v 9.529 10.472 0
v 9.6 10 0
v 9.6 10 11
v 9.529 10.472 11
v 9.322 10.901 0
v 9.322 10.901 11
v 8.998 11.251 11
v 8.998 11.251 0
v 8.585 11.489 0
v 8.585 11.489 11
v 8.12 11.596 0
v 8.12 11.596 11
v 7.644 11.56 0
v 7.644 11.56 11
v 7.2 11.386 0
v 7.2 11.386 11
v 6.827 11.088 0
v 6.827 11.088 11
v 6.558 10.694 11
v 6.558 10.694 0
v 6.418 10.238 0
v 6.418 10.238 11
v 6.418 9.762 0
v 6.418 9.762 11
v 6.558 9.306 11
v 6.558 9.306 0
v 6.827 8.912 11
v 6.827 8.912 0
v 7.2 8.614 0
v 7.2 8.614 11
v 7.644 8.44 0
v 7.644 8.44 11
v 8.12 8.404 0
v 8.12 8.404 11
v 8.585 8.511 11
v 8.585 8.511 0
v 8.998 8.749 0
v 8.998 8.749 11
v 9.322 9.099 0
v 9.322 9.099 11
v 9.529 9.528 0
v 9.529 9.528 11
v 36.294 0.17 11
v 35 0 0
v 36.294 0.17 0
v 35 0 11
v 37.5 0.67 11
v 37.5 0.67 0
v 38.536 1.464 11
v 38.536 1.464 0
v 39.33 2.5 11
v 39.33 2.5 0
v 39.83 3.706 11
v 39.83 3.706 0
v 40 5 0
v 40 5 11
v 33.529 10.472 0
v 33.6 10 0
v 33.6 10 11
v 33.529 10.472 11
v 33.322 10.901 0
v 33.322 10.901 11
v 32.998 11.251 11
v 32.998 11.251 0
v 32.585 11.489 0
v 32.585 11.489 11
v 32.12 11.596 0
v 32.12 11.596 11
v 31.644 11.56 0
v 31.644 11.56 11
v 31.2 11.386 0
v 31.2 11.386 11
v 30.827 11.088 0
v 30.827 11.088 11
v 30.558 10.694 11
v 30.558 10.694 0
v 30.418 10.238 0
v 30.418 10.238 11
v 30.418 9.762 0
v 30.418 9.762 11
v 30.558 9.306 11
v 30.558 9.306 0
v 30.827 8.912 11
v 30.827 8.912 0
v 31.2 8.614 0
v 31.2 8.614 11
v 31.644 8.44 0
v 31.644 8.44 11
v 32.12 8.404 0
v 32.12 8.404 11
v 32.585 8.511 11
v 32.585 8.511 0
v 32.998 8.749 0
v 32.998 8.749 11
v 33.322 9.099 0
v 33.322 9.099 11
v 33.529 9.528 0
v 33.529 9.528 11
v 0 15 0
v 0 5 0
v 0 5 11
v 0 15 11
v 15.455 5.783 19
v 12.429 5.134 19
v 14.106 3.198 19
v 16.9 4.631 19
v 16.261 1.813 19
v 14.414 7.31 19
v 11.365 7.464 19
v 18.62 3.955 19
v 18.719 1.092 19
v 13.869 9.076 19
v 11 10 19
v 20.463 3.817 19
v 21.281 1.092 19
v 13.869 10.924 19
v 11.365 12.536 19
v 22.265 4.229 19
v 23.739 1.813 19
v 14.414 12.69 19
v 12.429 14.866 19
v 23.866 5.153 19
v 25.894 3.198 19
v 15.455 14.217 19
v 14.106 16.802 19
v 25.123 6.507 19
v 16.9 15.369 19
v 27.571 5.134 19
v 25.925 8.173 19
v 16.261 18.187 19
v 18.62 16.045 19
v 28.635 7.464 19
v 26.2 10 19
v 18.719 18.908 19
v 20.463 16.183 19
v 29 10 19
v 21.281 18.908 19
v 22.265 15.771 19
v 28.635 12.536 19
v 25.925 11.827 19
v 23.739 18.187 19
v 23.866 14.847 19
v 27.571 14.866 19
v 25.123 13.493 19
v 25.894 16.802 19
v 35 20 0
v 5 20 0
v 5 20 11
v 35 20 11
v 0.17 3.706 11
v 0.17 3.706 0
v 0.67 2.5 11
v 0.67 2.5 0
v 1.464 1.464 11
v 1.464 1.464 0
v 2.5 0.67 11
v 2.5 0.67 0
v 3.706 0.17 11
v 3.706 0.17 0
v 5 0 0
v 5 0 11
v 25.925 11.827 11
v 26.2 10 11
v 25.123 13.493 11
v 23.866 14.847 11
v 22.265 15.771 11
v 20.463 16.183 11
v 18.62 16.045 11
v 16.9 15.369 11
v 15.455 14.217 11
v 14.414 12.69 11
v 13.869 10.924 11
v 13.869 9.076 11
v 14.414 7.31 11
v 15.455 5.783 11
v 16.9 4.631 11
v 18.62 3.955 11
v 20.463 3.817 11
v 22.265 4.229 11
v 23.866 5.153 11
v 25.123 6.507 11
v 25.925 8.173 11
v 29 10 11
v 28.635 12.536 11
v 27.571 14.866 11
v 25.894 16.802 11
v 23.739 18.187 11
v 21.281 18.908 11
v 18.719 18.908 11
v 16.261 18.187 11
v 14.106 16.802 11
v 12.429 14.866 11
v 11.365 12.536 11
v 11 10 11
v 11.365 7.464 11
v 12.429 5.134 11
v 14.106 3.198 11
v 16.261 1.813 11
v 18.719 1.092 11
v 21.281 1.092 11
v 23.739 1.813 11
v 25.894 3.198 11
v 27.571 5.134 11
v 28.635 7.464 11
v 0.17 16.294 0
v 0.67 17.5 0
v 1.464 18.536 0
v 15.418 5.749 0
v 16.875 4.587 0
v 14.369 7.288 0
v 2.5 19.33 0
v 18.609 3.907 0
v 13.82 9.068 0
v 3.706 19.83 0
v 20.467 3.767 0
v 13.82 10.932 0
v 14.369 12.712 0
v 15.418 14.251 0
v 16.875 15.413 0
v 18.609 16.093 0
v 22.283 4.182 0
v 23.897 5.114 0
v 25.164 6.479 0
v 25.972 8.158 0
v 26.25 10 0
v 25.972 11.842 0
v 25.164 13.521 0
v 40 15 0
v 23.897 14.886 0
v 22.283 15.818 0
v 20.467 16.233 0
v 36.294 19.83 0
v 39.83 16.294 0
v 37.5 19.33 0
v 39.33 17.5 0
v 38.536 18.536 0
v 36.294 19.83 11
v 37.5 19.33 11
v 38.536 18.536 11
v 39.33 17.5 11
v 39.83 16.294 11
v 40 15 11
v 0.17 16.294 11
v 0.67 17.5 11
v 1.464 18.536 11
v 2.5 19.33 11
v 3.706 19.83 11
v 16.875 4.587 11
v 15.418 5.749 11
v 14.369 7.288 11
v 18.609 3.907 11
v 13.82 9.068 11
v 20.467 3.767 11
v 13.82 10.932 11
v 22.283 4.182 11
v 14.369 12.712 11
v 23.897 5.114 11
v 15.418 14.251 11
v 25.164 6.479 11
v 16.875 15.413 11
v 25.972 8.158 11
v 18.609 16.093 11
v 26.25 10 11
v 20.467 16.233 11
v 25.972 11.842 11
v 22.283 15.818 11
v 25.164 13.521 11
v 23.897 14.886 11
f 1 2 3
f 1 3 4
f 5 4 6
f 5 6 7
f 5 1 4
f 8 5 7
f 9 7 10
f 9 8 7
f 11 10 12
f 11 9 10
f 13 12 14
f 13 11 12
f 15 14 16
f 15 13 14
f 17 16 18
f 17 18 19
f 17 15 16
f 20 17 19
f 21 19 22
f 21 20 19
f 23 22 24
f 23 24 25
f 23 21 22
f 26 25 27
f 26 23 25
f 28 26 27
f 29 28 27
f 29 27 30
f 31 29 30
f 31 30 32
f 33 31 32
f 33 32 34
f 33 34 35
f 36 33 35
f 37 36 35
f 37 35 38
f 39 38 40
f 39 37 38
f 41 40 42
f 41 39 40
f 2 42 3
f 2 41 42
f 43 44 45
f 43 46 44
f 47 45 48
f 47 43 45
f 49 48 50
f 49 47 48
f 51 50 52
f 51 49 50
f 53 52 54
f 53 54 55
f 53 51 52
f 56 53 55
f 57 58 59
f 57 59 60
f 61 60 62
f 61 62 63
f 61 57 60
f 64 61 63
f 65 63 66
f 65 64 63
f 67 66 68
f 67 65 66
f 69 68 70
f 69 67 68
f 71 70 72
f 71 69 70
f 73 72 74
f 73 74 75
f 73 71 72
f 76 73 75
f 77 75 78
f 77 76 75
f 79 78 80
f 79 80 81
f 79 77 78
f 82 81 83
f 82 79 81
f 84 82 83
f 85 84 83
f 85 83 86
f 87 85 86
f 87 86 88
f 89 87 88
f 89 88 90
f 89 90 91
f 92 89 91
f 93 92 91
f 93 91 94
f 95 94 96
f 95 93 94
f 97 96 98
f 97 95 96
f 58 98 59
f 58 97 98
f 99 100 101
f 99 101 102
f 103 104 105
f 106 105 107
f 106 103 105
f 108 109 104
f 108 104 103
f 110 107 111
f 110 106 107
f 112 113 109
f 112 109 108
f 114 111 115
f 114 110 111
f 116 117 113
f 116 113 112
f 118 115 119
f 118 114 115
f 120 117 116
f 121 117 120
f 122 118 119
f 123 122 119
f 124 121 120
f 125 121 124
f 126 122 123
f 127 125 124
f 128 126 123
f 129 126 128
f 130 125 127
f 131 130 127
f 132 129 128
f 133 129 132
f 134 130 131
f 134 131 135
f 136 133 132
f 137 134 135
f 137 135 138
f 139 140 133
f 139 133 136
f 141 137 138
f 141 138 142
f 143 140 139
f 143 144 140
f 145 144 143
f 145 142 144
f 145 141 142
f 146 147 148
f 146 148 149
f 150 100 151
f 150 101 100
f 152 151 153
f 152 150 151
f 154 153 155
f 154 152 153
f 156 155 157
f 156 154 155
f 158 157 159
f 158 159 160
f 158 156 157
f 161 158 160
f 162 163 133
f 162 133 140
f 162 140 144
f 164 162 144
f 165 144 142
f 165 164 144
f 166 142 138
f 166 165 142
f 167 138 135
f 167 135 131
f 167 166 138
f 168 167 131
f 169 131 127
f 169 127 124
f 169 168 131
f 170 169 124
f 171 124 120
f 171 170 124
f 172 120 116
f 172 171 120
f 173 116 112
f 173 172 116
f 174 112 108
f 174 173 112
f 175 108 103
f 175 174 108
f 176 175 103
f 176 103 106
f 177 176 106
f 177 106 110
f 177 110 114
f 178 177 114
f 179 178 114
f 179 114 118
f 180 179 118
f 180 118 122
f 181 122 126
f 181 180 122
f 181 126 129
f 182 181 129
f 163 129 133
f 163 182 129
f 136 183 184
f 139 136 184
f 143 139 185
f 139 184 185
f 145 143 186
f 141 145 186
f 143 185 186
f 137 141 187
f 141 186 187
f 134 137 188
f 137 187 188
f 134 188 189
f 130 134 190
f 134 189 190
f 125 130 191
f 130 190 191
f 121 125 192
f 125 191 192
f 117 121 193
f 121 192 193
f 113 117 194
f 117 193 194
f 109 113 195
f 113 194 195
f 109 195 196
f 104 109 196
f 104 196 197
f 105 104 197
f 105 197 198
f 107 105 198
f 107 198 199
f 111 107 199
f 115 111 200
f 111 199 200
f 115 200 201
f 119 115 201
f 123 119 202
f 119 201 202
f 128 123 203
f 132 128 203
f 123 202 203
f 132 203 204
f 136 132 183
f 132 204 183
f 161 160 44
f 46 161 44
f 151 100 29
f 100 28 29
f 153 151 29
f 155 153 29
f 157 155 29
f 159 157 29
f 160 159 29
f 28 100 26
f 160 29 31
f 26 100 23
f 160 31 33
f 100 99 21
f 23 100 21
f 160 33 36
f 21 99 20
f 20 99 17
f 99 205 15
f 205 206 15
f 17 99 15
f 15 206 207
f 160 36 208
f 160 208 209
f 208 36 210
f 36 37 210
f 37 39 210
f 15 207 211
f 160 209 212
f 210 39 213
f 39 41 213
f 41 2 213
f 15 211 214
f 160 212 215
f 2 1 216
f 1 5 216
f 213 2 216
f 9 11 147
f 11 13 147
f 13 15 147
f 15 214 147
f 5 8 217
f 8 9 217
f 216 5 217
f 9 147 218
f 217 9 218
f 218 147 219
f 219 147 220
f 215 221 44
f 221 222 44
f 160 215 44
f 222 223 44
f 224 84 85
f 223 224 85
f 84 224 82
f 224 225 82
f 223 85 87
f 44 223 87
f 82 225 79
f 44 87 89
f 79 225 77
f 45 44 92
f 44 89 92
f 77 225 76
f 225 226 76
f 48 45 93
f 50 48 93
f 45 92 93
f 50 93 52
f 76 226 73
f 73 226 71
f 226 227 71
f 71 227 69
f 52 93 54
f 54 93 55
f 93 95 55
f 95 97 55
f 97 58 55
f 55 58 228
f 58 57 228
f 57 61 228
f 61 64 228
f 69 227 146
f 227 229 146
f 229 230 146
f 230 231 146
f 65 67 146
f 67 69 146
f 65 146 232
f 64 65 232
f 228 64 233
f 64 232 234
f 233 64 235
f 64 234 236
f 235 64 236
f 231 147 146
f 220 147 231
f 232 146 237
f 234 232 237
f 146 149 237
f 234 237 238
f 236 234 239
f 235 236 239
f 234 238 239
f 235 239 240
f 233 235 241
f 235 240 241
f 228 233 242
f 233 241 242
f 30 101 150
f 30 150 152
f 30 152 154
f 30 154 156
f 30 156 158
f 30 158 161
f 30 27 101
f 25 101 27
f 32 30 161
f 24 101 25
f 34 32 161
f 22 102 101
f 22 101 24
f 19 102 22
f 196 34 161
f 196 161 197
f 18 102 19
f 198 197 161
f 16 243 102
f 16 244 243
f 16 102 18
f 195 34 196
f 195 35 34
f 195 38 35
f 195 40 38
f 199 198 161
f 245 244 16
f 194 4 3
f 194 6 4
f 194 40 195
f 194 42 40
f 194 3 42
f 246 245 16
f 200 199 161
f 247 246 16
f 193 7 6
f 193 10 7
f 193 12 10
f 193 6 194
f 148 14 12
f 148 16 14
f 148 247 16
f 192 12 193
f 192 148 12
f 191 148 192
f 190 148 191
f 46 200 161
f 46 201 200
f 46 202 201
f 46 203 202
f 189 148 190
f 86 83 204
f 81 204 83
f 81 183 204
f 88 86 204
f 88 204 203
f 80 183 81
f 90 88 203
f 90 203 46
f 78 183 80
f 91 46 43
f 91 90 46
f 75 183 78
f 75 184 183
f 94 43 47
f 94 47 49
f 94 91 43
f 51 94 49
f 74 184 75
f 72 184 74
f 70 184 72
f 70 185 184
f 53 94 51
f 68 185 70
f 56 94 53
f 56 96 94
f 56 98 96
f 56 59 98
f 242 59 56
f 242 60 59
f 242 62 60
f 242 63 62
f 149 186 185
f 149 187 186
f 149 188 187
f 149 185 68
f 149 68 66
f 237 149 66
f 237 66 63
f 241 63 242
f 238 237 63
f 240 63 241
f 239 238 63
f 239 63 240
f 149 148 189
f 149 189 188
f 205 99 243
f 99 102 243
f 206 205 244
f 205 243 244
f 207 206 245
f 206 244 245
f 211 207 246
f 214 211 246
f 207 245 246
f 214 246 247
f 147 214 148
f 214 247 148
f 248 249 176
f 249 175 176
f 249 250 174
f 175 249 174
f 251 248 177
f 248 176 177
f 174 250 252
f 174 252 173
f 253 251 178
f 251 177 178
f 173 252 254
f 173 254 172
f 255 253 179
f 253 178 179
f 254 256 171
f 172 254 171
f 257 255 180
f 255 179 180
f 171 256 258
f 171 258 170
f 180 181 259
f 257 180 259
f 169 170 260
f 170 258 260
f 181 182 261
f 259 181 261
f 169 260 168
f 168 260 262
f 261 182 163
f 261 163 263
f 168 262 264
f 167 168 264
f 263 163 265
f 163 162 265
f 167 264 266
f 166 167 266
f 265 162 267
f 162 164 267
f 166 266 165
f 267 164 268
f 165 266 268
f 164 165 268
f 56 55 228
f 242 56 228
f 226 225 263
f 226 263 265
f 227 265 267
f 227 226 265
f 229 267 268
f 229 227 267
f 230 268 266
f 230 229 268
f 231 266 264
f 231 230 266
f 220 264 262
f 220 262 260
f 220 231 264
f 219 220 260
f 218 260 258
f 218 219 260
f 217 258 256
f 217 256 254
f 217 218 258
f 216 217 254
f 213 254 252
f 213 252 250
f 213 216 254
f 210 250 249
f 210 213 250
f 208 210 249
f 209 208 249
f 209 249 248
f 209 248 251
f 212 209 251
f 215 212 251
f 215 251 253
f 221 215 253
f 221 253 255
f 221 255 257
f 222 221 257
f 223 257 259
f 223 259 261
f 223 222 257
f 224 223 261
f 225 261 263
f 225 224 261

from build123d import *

# Parameters (mm, degrees)
F0_W     = 40
F0_H     = 20
F0_R     = 1.6
F0_R_2   = 6.25
F1_DEPTH = 11
F2_R     = 9
F2_R_2   = 6.2
F3_DEPTH = 8
F4_R     = 5


with BuildPart() as f1:
    # F0 (on Top) → F1 (new body)
    with BuildSketch(Plane.XY):
        with Locations((20, 10)):
            Rectangle(F0_W, F0_H)
        with Locations((8, 10)):
            Circle(F0_R, mode=Mode.SUBTRACT)
        with Locations((20, 10)):
            Circle(F0_R_2, mode=Mode.SUBTRACT)
        with Locations((32, 10)):
            Circle(F0_R, mode=Mode.SUBTRACT)
    extrude(amount=F1_DEPTH)

    # F2 (on face) → F3 (join)
    with BuildSketch(Plane.XY.offset(11)):
        with Locations((20, 10)):
            Circle(F2_R)
        with Locations((20, 10)):
            Circle(F2_R_2, mode=Mode.SUBTRACT)
    extrude(amount=F3_DEPTH)

    # F4
    f4_edges = [f1.edges().sort_by_distance(p)[0] for p in [
        (40, 20, 5.5),
        (40, 0, 5.5),
        (0, 0, 5.5),
        (0, 20, 5.5),
    ]]
    fillet(f4_edges, radius=F4_R)


solid = f1.part
